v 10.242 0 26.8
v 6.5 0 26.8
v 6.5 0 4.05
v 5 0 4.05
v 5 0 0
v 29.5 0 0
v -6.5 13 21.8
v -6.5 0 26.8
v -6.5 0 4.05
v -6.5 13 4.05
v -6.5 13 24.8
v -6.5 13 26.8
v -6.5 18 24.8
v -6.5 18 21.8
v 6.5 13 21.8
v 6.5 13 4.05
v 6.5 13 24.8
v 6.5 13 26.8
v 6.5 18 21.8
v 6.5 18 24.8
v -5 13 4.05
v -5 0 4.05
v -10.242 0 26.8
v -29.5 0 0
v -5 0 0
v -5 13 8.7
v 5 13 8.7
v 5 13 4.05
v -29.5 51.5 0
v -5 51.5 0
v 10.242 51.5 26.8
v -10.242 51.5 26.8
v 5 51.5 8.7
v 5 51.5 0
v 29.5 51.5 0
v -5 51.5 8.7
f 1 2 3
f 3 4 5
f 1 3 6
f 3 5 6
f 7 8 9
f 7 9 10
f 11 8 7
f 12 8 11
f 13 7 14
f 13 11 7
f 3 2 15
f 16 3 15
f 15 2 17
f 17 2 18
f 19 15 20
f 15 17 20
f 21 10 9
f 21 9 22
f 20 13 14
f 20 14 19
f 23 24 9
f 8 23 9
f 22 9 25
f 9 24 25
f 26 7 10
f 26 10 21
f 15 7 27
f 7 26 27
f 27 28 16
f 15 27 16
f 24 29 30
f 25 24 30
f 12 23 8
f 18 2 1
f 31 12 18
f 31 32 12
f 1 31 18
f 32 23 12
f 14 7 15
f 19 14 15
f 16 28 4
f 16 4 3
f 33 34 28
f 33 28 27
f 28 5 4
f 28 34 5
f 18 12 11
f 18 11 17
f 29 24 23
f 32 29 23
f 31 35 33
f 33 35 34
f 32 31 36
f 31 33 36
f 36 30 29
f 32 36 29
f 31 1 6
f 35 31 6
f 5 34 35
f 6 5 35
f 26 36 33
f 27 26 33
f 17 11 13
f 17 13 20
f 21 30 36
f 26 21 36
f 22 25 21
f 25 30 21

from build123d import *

# Parameters (mm, degrees)
F1_DEPTH = 26.8
F3_DEPTH = 51.5
F4_W     = 13
F4_H     = 3
F5_DEPTH = 5
F6_W     = 1.5
F6_H     = 13
F7_DEPTH = 22.75
F8_W     = 10
F8_H     = 8.7
F9_DEPTH = 38.5


with BuildPart() as f1:
    # F0 (on Top) → F1 (new body)
    with BuildSketch(Plane.XY):
        Polygon((29.5, 51.5), (-29.5, 51.5), (-29.5, 0), (-5, 0), (-5, 13), (5, 13), (5, 0), (29.5, 0), align=None)
    extrude(amount=F1_DEPTH)

    # F2 (on face) → F3 (cut, through all)
    with BuildSketch(Plane.XZ):
        Polygon((10.242246, 26.8), (29.5, 0), (29.5, 26.8), align=None)
        Polygon((-29.5, 26.8), (-29.5, 0), (-10.242246, 26.8), align=None)
    extrude(amount=-F3_DEPTH, mode=Mode.SUBTRACT)

    # F4 (on face) → F5 (cut)
    with BuildSketch(Plane.XZ.offset(-13)):
        with Locations((0, 23.3)):
            Rectangle(F4_W, F4_H)
    extrude(amount=-F5_DEPTH, mode=Mode.SUBTRACT)

    # F6 (on face) → F7 (cut)
    with BuildSketch(Plane.XY.offset(26.8)):
        with Locations((-5.75, 6.5)):
            Rectangle(F6_W, F6_H)
        with Locations((5.75, 6.5)):
            Rectangle(F6_W, F6_H)
    extrude(amount=-F7_DEPTH, mode=Mode.SUBTRACT)

    # F8 (on face) → F9 (cut, through all)
    with BuildSketch(Plane.XZ.offset(-13)):
        with Locations((0, 4.35)):
            Rectangle(F8_W, F8_H)
    extrude(amount=-F9_DEPTH, mode=Mode.SUBTRACT)


solid = f1.part
